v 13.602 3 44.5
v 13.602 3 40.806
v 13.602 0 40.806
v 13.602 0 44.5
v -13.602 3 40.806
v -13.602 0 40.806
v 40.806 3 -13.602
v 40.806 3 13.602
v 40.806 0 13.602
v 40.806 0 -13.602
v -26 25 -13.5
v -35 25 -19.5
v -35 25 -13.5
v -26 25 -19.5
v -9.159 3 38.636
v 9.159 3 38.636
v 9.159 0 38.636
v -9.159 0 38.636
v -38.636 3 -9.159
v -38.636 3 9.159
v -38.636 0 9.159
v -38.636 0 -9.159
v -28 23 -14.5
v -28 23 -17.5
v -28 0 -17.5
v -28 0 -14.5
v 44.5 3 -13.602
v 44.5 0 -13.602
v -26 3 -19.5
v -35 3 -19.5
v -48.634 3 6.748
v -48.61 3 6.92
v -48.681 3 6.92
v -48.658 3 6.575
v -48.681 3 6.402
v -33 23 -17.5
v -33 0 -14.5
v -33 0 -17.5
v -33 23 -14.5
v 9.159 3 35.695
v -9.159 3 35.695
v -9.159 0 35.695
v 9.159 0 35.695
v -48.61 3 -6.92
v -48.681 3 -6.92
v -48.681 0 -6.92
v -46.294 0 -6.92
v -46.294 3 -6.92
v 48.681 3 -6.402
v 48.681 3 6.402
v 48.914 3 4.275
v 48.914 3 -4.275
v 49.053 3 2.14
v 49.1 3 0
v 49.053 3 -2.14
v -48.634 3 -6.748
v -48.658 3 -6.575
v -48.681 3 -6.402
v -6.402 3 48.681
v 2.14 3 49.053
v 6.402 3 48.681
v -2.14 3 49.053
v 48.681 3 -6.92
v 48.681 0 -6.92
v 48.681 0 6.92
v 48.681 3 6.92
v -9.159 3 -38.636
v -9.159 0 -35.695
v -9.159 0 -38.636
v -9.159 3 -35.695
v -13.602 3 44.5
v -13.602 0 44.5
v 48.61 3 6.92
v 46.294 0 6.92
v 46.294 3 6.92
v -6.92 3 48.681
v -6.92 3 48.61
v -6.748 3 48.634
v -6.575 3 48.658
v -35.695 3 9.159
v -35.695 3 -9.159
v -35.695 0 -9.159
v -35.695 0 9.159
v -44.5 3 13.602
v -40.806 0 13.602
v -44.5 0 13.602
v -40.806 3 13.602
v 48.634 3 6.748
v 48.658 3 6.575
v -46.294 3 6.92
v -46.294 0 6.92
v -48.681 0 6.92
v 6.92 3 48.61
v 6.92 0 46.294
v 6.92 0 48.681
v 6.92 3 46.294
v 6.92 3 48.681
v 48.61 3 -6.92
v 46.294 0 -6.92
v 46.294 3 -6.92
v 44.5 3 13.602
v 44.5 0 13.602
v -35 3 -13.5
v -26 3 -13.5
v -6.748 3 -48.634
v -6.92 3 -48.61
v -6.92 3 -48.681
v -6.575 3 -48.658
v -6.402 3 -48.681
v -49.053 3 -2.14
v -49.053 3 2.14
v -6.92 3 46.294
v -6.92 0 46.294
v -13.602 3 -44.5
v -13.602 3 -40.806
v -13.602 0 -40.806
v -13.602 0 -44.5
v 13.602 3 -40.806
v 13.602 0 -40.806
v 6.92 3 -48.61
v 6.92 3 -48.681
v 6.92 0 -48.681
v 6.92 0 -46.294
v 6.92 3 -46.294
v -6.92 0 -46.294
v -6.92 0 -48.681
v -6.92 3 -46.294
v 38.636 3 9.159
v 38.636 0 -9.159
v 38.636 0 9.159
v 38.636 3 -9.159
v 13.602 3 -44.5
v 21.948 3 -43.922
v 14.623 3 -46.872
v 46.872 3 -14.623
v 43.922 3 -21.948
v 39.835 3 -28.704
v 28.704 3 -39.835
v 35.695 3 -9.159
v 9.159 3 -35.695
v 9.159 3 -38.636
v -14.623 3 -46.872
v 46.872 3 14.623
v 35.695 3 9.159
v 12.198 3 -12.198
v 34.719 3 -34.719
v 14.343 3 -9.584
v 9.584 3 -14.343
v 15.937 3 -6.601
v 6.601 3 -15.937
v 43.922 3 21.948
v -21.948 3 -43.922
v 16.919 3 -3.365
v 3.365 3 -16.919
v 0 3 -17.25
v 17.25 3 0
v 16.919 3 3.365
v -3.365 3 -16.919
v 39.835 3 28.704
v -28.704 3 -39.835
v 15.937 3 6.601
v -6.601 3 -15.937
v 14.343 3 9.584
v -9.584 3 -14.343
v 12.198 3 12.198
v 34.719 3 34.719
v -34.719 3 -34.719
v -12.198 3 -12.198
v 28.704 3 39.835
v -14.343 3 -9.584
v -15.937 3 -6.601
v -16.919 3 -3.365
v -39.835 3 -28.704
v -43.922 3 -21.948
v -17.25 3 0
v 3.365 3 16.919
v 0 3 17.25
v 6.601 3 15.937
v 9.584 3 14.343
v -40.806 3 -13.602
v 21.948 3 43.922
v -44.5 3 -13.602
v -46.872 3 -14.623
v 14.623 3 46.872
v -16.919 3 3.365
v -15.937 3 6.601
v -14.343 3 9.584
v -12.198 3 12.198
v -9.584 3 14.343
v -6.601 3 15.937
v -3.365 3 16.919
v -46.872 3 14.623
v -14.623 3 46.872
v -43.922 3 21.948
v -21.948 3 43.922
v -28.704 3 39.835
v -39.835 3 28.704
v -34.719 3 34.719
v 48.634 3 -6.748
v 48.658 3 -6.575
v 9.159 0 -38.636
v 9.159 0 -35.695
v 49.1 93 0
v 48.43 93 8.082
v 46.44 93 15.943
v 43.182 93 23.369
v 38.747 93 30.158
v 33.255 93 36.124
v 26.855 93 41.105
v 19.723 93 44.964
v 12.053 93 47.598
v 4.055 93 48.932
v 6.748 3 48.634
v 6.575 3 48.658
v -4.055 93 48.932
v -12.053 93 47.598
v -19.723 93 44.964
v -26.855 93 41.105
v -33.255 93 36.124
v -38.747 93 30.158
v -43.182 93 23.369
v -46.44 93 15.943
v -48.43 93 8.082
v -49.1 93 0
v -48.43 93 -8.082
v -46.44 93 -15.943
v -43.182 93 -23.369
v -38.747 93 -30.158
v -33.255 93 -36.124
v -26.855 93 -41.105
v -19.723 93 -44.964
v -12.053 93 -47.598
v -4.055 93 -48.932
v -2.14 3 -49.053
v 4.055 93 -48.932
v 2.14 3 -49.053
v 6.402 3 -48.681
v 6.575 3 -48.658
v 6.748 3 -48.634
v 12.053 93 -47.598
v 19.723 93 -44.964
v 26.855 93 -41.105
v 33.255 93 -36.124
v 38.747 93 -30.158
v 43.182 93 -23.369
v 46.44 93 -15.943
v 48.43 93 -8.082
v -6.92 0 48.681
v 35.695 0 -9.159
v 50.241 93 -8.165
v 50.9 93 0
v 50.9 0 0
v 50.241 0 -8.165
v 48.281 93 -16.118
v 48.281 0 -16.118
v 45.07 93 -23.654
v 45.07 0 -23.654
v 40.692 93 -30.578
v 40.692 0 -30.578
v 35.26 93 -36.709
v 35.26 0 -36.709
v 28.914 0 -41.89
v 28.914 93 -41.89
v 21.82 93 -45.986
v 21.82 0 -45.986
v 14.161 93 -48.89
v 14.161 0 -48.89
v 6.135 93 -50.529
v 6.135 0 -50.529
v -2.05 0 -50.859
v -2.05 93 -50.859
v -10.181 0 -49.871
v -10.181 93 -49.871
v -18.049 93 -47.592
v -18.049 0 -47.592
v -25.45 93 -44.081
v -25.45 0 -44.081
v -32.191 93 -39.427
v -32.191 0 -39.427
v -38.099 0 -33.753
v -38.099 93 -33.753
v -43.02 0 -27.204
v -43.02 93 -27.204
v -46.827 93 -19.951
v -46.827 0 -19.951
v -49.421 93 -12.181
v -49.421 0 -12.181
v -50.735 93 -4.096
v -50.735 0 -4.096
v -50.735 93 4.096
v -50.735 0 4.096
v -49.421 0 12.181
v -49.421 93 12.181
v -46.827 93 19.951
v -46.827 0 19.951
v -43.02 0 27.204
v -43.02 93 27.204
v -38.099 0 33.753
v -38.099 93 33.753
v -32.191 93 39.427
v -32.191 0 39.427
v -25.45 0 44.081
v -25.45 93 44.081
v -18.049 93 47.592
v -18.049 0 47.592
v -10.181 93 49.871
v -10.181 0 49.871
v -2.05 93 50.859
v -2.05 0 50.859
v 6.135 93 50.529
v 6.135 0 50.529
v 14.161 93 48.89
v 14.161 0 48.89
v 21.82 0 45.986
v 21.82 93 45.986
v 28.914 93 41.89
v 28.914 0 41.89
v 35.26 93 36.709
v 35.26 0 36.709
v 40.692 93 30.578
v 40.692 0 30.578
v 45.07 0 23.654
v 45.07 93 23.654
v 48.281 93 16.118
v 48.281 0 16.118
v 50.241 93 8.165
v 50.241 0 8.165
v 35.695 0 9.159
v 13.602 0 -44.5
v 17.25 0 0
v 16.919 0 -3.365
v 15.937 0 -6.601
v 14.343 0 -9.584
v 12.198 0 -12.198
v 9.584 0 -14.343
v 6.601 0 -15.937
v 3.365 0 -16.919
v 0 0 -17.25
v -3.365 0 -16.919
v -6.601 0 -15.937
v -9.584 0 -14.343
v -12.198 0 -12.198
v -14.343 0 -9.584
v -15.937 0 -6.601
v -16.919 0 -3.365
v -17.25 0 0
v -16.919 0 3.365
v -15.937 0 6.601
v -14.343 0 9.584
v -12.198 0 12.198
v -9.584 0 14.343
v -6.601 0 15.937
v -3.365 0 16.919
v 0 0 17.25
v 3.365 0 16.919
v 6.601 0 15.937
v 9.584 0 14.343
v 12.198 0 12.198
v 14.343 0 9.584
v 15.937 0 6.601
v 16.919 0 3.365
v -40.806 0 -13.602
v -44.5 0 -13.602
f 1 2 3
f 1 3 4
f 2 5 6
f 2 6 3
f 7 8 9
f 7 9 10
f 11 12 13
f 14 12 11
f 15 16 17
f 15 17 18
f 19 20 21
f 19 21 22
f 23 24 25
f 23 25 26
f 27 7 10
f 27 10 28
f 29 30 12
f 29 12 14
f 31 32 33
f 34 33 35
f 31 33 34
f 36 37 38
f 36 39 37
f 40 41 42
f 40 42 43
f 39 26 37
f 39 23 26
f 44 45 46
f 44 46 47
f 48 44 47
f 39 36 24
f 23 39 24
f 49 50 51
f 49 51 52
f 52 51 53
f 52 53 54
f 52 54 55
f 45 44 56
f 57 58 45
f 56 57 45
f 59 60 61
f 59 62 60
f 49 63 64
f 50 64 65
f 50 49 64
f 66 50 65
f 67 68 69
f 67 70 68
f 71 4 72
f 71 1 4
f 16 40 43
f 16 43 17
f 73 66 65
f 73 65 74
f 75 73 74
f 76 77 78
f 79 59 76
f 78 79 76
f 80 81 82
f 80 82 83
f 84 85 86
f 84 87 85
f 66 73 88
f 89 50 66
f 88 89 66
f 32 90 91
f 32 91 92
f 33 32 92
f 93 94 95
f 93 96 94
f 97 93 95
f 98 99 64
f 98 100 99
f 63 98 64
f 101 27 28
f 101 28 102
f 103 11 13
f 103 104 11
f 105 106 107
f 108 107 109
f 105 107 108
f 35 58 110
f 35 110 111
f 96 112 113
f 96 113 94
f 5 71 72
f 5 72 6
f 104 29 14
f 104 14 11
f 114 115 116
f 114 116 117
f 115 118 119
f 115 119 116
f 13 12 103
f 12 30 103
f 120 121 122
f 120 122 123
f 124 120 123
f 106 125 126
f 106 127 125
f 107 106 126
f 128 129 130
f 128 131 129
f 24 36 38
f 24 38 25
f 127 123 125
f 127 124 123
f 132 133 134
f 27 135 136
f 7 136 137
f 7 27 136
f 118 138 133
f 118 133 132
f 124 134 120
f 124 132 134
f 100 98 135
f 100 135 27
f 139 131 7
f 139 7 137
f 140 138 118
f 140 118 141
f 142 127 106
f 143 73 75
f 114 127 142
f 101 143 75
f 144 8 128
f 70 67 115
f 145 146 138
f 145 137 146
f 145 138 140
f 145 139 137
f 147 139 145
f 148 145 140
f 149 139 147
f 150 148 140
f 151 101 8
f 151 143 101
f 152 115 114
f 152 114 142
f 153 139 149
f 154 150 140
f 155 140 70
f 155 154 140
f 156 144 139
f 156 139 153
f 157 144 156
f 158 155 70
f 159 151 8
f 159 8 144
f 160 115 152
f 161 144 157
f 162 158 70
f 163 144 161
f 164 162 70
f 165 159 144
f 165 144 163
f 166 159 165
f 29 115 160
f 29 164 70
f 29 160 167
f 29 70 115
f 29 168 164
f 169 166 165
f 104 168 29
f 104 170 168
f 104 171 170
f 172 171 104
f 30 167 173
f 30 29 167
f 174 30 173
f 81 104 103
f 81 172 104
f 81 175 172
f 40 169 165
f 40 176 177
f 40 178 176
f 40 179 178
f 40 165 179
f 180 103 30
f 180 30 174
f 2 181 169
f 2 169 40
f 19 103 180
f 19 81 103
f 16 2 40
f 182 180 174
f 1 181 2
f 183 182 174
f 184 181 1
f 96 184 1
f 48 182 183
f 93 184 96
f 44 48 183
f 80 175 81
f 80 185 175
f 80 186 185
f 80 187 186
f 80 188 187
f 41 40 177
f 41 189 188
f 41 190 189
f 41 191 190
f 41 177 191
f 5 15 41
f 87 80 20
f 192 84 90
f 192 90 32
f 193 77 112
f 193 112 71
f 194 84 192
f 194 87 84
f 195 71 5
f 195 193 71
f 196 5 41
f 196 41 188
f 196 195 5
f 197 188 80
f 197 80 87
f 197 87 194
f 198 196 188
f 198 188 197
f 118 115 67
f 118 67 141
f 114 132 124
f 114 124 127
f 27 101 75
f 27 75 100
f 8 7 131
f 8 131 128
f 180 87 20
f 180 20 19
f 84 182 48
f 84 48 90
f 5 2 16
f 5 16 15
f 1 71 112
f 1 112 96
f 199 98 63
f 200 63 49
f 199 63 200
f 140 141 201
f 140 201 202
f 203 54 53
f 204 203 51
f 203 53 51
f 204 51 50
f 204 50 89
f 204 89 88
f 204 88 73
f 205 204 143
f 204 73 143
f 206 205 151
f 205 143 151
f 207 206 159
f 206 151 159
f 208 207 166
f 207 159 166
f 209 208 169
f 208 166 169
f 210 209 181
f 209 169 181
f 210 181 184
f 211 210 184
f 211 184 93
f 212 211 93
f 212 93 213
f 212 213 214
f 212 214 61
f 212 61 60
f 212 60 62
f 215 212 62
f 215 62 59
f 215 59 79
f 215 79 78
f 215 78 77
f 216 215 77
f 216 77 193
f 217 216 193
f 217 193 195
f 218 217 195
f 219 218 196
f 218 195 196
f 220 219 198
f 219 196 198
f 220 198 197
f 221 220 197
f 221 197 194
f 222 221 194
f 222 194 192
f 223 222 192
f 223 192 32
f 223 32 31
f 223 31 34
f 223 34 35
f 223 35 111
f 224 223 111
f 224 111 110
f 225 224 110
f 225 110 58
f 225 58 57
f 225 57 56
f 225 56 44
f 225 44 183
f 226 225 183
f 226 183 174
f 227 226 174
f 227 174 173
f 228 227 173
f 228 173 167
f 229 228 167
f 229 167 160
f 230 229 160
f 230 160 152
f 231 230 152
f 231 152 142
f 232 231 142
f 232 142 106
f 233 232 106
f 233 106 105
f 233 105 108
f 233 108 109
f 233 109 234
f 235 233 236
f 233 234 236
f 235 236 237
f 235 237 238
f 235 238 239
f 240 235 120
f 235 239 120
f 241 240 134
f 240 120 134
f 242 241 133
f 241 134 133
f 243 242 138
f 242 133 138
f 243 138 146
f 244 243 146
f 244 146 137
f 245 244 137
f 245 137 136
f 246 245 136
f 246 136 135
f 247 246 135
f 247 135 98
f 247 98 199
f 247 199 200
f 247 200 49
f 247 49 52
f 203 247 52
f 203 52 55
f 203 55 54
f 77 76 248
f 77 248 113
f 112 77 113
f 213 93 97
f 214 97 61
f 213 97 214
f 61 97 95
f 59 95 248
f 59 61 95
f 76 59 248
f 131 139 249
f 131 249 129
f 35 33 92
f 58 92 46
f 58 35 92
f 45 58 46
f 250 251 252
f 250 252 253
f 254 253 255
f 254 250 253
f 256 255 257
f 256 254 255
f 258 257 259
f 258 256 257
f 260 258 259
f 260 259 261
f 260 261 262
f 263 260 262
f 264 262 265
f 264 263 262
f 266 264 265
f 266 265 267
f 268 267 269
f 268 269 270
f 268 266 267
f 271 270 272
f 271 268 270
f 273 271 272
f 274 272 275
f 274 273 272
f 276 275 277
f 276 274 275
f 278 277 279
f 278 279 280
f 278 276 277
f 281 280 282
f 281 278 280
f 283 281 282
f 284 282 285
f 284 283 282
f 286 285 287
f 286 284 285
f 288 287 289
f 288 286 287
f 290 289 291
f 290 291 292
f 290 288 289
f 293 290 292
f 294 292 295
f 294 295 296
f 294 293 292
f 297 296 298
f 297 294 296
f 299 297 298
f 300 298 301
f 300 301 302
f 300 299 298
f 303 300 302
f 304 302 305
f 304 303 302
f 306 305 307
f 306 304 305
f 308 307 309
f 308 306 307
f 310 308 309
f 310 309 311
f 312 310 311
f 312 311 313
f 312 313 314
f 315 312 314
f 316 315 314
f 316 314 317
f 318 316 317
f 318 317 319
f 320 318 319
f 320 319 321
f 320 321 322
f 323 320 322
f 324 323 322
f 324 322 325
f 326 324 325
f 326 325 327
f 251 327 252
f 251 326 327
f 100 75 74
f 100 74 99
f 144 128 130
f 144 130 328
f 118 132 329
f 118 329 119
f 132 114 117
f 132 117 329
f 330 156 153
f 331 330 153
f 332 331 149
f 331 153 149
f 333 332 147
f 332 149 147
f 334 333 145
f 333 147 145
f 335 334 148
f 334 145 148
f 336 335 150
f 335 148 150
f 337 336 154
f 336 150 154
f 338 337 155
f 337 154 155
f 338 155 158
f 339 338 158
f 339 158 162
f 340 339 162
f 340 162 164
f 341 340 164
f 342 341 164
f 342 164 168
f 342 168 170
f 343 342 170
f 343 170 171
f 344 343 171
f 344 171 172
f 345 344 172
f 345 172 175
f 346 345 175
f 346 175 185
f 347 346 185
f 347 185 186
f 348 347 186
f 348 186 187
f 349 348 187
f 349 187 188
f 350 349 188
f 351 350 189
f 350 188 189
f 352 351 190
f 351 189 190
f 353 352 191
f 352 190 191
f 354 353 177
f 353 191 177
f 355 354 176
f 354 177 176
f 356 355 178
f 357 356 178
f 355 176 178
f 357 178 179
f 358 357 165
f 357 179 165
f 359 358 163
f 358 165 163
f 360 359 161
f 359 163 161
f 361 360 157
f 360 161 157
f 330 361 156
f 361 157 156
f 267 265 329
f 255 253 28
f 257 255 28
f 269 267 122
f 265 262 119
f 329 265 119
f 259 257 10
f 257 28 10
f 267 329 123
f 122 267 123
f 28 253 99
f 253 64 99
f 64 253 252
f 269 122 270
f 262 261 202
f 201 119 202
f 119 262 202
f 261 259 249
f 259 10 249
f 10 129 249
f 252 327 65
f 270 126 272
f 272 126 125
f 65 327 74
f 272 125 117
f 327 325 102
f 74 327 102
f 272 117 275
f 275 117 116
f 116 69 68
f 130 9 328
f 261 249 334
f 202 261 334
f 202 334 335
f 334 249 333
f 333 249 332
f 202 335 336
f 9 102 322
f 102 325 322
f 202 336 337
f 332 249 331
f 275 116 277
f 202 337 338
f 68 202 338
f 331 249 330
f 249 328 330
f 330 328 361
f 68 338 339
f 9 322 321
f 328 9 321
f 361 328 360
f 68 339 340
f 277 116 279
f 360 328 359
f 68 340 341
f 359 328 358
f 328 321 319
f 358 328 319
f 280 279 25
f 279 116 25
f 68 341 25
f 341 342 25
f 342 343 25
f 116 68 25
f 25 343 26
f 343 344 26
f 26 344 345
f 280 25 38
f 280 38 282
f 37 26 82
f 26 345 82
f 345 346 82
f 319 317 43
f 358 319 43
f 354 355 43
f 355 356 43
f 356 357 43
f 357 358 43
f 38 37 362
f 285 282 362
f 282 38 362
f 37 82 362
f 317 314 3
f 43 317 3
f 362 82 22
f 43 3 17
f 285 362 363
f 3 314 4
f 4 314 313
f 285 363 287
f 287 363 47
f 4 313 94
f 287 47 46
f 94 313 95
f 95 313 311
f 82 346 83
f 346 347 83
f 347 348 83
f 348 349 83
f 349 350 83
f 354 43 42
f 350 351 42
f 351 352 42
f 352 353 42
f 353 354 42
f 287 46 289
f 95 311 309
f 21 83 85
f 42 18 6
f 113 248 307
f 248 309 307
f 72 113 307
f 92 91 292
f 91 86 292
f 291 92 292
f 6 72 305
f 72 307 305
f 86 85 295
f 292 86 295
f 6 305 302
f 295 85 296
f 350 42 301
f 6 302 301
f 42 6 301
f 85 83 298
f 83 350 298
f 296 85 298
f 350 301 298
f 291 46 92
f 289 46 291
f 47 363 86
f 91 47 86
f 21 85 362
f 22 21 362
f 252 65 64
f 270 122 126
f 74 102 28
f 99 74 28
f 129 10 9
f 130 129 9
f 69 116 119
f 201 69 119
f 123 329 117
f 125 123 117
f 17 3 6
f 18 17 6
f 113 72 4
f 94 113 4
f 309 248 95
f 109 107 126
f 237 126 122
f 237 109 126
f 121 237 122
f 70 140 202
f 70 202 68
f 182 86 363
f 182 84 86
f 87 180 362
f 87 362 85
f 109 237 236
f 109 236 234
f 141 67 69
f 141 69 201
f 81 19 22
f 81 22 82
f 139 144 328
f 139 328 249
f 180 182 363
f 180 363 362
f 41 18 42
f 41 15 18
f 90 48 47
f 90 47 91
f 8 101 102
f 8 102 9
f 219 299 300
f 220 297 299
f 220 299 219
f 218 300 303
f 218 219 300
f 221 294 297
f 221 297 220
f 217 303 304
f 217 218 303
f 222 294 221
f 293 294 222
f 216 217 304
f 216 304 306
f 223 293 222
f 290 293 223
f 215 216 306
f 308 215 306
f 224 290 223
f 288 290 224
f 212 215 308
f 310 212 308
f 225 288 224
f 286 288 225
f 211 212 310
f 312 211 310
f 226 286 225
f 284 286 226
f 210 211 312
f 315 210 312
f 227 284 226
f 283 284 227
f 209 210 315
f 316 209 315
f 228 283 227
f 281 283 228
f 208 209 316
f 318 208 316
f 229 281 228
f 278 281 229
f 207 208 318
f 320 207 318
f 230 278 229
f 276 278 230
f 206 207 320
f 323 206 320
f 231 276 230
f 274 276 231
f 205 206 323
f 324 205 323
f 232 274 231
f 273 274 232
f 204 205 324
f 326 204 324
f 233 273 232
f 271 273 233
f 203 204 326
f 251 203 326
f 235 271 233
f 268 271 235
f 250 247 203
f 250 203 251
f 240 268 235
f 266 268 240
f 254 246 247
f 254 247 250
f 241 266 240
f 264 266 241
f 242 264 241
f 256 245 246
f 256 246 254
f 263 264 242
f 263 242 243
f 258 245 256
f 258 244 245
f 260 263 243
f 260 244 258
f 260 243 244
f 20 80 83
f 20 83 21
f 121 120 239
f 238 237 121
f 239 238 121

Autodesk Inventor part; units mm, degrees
ref_plane "YZ Plane" through (0, 0, 0) normal (1, 0, 0) x (0, 1, 0)
ref_plane "XZ Plane" through (0, 0, 0) normal (0, 1, 0) x (-1, 0, 0)
ref_plane "XY Plane" through (0, 0, 0) normal (0, 0, 1) x (1, 0, 0)
sketch "Sketch1" plane through (0, 0, 0) normal (0, 1, 0) x (-1, 0, 0)
  circle A0 centre (0, 0) radius 49.1
  dimension "d12" = 98.2
extrude "Extrusion1" add sketch "Sketch1" along normal blind 3
mirror "Mirror1" about plane through (0, 0, 0) normal (0, 0, 1)
sketch "Sketch10" plane through (0, 3, 0) normal (0, 1, 0) x (1, 0, 0)
  circle A0 centre (0, 0) radius 49.1
  circle A1 centre (0, 0) radius 50.9
  dimension "d23" = 101.8
  dimension "d52" = 1.8
extrude "Extrusion4" add sketch "Sketch10" along normal blind 90 and the other way blind 3
sketch "Sketch13" plane through (0, 3, 0) normal (0, 1, 0) x (1, 0, 0)
  line L0 (-35, 13.5) -> (-26, 13.5)
  line L1 (-26, 13.5) -> (-26, 19.5)
  line L2 (-26, 19.5) -> (-35, 19.5)
  line L3 (-35, 19.5) -> (-35, 13.5)
  line L4 (-28, 14.5) -> (-33, 14.5)
  line L5 (-33, 14.5) -> (-33, 17.5)
  line L6 (-33, 17.5) -> (-28, 17.5)
  line L7 (-28, 17.5) -> (-28, 14.5)
  line L8 (0, 0) -> (0, 20.276) construction
  line L9 (-35, 13.5) -> (0, 13.5) construction
  dimension "d31" = 9
  dimension "d32" = 6
  dimension "d33" = 3
  dimension "d35" = 5
  dimension "d36" = 2
  dimension "d54" = 13.5
  dimension "d58" = 26
extrude "Extrusion6" add sketch "Sketch13" along normal blind 20
sketch "Sketch14" plane through (0, 3, 0) normal (0, 1, 0) x (1, 0, 0)
  line L0 (-33, 17.5) -> (-28, 17.5) projected
  line L1 (-28, 14.5) -> (-33, 14.5) projected
  line L2 (-33, 17.5) -> (-28, 17.5)
  line L3 (-28, 17.5) -> (-28, 14.5)
  line L4 (-28, 14.5) -> (-33, 14.5)
  line L5 (-33, 14.5) -> (-33, 17.5)
  point P0 (0, 0)
extrude "Extrusion7" cut sketch "Sketch14" against normal blind 5
sketch "Sketch15" plane through (0, 23, 0) normal (0, 1, 0) x (1, 0, 0)
  line L0 (-35, 19.5) -> (-35, 13.5) projected
  line L1 (-35, 19.5) -> (-26, 19.5)
  line L2 (-26, 19.5) -> (-26, 13.5)
  line L3 (-26, 13.5) -> (-35, 13.5)
  line L4 (-35, 13.5) -> (-35, 19.5)
  point P0 (0, 0)
extrude "Extrusion8" add sketch "Sketch15" along normal blind 2
sketch "Sketch17" plane through (0, 3, 0) normal (0, 1, 0) x (1, 0, 0)
  line L0 (48.6808, -6.9203) -> (46.2945, -6.9203)
  line L1 (46.2945, -6.9203) -> (46.2945, 6.9203)
  line L2 (46.2945, 6.9203) -> (48.6808, 6.9203)
  line L3 (48.6808, 6.9203) -> (48.6808, -6.9203)
  line L4 (48.6808, -6.9203) -> (46.2945, 6.9203) construction
  line L5 (46.2945, -6.9203) -> (48.6808, 6.9203) construction
  line L6 (44.5001, -13.602) -> (40.806, -13.602)
  line L7 (40.806, -13.602) -> (40.806, 13.602)
  line L8 (40.806, 13.602) -> (44.5001, 13.602)
  line L9 (44.5001, 13.602) -> (44.5001, -13.602)
  line L10 (44.5001, -13.602) -> (40.806, 13.602) construction
  line L11 (40.806, -13.602) -> (44.5001, 13.602) construction
  line L12 (38.6361, -9.1592) -> (35.6953, -9.1592)
  line L13 (35.6953, -9.1592) -> (35.6953, 9.1592)
  line L14 (35.6953, 9.1592) -> (38.6361, 9.1592)
  line L15 (38.6361, 9.1592) -> (38.6361, -9.1592)
  line L16 (38.6361, -9.1592) -> (35.6953, 9.1592) construction
  line L17 (35.6953, -9.1592) -> (38.6361, 9.1592) construction
  point P0 (0, 0)
  point P1 (47.4877, 0)
  point P2 (42.6531, 0)
  point P3 (37.1657, 0)
extrude "Extrusion10" cut sketch "Sketch17" against normal blind 5
pattern_circular "Circular Pattern1" count 4 over 360 about axis through (0, -10, 0) along (0, 1, 0) of "Extrusion10"
sketch "Sketch18" plane through (0, 3, 0) normal (0, 1, 0) x (1, 0, 0)
  circle A0 centre (0, 0) radius 17.25
  dimension "d55" = 34.5
extrude "Extrusion11" cut sketch "Sketch18" against normal blind 10
ref_plane "Work Plane1" through (0, 0, 0) normal (0, 0, 1) x (1, 0, 0)
properties part number "Base"
